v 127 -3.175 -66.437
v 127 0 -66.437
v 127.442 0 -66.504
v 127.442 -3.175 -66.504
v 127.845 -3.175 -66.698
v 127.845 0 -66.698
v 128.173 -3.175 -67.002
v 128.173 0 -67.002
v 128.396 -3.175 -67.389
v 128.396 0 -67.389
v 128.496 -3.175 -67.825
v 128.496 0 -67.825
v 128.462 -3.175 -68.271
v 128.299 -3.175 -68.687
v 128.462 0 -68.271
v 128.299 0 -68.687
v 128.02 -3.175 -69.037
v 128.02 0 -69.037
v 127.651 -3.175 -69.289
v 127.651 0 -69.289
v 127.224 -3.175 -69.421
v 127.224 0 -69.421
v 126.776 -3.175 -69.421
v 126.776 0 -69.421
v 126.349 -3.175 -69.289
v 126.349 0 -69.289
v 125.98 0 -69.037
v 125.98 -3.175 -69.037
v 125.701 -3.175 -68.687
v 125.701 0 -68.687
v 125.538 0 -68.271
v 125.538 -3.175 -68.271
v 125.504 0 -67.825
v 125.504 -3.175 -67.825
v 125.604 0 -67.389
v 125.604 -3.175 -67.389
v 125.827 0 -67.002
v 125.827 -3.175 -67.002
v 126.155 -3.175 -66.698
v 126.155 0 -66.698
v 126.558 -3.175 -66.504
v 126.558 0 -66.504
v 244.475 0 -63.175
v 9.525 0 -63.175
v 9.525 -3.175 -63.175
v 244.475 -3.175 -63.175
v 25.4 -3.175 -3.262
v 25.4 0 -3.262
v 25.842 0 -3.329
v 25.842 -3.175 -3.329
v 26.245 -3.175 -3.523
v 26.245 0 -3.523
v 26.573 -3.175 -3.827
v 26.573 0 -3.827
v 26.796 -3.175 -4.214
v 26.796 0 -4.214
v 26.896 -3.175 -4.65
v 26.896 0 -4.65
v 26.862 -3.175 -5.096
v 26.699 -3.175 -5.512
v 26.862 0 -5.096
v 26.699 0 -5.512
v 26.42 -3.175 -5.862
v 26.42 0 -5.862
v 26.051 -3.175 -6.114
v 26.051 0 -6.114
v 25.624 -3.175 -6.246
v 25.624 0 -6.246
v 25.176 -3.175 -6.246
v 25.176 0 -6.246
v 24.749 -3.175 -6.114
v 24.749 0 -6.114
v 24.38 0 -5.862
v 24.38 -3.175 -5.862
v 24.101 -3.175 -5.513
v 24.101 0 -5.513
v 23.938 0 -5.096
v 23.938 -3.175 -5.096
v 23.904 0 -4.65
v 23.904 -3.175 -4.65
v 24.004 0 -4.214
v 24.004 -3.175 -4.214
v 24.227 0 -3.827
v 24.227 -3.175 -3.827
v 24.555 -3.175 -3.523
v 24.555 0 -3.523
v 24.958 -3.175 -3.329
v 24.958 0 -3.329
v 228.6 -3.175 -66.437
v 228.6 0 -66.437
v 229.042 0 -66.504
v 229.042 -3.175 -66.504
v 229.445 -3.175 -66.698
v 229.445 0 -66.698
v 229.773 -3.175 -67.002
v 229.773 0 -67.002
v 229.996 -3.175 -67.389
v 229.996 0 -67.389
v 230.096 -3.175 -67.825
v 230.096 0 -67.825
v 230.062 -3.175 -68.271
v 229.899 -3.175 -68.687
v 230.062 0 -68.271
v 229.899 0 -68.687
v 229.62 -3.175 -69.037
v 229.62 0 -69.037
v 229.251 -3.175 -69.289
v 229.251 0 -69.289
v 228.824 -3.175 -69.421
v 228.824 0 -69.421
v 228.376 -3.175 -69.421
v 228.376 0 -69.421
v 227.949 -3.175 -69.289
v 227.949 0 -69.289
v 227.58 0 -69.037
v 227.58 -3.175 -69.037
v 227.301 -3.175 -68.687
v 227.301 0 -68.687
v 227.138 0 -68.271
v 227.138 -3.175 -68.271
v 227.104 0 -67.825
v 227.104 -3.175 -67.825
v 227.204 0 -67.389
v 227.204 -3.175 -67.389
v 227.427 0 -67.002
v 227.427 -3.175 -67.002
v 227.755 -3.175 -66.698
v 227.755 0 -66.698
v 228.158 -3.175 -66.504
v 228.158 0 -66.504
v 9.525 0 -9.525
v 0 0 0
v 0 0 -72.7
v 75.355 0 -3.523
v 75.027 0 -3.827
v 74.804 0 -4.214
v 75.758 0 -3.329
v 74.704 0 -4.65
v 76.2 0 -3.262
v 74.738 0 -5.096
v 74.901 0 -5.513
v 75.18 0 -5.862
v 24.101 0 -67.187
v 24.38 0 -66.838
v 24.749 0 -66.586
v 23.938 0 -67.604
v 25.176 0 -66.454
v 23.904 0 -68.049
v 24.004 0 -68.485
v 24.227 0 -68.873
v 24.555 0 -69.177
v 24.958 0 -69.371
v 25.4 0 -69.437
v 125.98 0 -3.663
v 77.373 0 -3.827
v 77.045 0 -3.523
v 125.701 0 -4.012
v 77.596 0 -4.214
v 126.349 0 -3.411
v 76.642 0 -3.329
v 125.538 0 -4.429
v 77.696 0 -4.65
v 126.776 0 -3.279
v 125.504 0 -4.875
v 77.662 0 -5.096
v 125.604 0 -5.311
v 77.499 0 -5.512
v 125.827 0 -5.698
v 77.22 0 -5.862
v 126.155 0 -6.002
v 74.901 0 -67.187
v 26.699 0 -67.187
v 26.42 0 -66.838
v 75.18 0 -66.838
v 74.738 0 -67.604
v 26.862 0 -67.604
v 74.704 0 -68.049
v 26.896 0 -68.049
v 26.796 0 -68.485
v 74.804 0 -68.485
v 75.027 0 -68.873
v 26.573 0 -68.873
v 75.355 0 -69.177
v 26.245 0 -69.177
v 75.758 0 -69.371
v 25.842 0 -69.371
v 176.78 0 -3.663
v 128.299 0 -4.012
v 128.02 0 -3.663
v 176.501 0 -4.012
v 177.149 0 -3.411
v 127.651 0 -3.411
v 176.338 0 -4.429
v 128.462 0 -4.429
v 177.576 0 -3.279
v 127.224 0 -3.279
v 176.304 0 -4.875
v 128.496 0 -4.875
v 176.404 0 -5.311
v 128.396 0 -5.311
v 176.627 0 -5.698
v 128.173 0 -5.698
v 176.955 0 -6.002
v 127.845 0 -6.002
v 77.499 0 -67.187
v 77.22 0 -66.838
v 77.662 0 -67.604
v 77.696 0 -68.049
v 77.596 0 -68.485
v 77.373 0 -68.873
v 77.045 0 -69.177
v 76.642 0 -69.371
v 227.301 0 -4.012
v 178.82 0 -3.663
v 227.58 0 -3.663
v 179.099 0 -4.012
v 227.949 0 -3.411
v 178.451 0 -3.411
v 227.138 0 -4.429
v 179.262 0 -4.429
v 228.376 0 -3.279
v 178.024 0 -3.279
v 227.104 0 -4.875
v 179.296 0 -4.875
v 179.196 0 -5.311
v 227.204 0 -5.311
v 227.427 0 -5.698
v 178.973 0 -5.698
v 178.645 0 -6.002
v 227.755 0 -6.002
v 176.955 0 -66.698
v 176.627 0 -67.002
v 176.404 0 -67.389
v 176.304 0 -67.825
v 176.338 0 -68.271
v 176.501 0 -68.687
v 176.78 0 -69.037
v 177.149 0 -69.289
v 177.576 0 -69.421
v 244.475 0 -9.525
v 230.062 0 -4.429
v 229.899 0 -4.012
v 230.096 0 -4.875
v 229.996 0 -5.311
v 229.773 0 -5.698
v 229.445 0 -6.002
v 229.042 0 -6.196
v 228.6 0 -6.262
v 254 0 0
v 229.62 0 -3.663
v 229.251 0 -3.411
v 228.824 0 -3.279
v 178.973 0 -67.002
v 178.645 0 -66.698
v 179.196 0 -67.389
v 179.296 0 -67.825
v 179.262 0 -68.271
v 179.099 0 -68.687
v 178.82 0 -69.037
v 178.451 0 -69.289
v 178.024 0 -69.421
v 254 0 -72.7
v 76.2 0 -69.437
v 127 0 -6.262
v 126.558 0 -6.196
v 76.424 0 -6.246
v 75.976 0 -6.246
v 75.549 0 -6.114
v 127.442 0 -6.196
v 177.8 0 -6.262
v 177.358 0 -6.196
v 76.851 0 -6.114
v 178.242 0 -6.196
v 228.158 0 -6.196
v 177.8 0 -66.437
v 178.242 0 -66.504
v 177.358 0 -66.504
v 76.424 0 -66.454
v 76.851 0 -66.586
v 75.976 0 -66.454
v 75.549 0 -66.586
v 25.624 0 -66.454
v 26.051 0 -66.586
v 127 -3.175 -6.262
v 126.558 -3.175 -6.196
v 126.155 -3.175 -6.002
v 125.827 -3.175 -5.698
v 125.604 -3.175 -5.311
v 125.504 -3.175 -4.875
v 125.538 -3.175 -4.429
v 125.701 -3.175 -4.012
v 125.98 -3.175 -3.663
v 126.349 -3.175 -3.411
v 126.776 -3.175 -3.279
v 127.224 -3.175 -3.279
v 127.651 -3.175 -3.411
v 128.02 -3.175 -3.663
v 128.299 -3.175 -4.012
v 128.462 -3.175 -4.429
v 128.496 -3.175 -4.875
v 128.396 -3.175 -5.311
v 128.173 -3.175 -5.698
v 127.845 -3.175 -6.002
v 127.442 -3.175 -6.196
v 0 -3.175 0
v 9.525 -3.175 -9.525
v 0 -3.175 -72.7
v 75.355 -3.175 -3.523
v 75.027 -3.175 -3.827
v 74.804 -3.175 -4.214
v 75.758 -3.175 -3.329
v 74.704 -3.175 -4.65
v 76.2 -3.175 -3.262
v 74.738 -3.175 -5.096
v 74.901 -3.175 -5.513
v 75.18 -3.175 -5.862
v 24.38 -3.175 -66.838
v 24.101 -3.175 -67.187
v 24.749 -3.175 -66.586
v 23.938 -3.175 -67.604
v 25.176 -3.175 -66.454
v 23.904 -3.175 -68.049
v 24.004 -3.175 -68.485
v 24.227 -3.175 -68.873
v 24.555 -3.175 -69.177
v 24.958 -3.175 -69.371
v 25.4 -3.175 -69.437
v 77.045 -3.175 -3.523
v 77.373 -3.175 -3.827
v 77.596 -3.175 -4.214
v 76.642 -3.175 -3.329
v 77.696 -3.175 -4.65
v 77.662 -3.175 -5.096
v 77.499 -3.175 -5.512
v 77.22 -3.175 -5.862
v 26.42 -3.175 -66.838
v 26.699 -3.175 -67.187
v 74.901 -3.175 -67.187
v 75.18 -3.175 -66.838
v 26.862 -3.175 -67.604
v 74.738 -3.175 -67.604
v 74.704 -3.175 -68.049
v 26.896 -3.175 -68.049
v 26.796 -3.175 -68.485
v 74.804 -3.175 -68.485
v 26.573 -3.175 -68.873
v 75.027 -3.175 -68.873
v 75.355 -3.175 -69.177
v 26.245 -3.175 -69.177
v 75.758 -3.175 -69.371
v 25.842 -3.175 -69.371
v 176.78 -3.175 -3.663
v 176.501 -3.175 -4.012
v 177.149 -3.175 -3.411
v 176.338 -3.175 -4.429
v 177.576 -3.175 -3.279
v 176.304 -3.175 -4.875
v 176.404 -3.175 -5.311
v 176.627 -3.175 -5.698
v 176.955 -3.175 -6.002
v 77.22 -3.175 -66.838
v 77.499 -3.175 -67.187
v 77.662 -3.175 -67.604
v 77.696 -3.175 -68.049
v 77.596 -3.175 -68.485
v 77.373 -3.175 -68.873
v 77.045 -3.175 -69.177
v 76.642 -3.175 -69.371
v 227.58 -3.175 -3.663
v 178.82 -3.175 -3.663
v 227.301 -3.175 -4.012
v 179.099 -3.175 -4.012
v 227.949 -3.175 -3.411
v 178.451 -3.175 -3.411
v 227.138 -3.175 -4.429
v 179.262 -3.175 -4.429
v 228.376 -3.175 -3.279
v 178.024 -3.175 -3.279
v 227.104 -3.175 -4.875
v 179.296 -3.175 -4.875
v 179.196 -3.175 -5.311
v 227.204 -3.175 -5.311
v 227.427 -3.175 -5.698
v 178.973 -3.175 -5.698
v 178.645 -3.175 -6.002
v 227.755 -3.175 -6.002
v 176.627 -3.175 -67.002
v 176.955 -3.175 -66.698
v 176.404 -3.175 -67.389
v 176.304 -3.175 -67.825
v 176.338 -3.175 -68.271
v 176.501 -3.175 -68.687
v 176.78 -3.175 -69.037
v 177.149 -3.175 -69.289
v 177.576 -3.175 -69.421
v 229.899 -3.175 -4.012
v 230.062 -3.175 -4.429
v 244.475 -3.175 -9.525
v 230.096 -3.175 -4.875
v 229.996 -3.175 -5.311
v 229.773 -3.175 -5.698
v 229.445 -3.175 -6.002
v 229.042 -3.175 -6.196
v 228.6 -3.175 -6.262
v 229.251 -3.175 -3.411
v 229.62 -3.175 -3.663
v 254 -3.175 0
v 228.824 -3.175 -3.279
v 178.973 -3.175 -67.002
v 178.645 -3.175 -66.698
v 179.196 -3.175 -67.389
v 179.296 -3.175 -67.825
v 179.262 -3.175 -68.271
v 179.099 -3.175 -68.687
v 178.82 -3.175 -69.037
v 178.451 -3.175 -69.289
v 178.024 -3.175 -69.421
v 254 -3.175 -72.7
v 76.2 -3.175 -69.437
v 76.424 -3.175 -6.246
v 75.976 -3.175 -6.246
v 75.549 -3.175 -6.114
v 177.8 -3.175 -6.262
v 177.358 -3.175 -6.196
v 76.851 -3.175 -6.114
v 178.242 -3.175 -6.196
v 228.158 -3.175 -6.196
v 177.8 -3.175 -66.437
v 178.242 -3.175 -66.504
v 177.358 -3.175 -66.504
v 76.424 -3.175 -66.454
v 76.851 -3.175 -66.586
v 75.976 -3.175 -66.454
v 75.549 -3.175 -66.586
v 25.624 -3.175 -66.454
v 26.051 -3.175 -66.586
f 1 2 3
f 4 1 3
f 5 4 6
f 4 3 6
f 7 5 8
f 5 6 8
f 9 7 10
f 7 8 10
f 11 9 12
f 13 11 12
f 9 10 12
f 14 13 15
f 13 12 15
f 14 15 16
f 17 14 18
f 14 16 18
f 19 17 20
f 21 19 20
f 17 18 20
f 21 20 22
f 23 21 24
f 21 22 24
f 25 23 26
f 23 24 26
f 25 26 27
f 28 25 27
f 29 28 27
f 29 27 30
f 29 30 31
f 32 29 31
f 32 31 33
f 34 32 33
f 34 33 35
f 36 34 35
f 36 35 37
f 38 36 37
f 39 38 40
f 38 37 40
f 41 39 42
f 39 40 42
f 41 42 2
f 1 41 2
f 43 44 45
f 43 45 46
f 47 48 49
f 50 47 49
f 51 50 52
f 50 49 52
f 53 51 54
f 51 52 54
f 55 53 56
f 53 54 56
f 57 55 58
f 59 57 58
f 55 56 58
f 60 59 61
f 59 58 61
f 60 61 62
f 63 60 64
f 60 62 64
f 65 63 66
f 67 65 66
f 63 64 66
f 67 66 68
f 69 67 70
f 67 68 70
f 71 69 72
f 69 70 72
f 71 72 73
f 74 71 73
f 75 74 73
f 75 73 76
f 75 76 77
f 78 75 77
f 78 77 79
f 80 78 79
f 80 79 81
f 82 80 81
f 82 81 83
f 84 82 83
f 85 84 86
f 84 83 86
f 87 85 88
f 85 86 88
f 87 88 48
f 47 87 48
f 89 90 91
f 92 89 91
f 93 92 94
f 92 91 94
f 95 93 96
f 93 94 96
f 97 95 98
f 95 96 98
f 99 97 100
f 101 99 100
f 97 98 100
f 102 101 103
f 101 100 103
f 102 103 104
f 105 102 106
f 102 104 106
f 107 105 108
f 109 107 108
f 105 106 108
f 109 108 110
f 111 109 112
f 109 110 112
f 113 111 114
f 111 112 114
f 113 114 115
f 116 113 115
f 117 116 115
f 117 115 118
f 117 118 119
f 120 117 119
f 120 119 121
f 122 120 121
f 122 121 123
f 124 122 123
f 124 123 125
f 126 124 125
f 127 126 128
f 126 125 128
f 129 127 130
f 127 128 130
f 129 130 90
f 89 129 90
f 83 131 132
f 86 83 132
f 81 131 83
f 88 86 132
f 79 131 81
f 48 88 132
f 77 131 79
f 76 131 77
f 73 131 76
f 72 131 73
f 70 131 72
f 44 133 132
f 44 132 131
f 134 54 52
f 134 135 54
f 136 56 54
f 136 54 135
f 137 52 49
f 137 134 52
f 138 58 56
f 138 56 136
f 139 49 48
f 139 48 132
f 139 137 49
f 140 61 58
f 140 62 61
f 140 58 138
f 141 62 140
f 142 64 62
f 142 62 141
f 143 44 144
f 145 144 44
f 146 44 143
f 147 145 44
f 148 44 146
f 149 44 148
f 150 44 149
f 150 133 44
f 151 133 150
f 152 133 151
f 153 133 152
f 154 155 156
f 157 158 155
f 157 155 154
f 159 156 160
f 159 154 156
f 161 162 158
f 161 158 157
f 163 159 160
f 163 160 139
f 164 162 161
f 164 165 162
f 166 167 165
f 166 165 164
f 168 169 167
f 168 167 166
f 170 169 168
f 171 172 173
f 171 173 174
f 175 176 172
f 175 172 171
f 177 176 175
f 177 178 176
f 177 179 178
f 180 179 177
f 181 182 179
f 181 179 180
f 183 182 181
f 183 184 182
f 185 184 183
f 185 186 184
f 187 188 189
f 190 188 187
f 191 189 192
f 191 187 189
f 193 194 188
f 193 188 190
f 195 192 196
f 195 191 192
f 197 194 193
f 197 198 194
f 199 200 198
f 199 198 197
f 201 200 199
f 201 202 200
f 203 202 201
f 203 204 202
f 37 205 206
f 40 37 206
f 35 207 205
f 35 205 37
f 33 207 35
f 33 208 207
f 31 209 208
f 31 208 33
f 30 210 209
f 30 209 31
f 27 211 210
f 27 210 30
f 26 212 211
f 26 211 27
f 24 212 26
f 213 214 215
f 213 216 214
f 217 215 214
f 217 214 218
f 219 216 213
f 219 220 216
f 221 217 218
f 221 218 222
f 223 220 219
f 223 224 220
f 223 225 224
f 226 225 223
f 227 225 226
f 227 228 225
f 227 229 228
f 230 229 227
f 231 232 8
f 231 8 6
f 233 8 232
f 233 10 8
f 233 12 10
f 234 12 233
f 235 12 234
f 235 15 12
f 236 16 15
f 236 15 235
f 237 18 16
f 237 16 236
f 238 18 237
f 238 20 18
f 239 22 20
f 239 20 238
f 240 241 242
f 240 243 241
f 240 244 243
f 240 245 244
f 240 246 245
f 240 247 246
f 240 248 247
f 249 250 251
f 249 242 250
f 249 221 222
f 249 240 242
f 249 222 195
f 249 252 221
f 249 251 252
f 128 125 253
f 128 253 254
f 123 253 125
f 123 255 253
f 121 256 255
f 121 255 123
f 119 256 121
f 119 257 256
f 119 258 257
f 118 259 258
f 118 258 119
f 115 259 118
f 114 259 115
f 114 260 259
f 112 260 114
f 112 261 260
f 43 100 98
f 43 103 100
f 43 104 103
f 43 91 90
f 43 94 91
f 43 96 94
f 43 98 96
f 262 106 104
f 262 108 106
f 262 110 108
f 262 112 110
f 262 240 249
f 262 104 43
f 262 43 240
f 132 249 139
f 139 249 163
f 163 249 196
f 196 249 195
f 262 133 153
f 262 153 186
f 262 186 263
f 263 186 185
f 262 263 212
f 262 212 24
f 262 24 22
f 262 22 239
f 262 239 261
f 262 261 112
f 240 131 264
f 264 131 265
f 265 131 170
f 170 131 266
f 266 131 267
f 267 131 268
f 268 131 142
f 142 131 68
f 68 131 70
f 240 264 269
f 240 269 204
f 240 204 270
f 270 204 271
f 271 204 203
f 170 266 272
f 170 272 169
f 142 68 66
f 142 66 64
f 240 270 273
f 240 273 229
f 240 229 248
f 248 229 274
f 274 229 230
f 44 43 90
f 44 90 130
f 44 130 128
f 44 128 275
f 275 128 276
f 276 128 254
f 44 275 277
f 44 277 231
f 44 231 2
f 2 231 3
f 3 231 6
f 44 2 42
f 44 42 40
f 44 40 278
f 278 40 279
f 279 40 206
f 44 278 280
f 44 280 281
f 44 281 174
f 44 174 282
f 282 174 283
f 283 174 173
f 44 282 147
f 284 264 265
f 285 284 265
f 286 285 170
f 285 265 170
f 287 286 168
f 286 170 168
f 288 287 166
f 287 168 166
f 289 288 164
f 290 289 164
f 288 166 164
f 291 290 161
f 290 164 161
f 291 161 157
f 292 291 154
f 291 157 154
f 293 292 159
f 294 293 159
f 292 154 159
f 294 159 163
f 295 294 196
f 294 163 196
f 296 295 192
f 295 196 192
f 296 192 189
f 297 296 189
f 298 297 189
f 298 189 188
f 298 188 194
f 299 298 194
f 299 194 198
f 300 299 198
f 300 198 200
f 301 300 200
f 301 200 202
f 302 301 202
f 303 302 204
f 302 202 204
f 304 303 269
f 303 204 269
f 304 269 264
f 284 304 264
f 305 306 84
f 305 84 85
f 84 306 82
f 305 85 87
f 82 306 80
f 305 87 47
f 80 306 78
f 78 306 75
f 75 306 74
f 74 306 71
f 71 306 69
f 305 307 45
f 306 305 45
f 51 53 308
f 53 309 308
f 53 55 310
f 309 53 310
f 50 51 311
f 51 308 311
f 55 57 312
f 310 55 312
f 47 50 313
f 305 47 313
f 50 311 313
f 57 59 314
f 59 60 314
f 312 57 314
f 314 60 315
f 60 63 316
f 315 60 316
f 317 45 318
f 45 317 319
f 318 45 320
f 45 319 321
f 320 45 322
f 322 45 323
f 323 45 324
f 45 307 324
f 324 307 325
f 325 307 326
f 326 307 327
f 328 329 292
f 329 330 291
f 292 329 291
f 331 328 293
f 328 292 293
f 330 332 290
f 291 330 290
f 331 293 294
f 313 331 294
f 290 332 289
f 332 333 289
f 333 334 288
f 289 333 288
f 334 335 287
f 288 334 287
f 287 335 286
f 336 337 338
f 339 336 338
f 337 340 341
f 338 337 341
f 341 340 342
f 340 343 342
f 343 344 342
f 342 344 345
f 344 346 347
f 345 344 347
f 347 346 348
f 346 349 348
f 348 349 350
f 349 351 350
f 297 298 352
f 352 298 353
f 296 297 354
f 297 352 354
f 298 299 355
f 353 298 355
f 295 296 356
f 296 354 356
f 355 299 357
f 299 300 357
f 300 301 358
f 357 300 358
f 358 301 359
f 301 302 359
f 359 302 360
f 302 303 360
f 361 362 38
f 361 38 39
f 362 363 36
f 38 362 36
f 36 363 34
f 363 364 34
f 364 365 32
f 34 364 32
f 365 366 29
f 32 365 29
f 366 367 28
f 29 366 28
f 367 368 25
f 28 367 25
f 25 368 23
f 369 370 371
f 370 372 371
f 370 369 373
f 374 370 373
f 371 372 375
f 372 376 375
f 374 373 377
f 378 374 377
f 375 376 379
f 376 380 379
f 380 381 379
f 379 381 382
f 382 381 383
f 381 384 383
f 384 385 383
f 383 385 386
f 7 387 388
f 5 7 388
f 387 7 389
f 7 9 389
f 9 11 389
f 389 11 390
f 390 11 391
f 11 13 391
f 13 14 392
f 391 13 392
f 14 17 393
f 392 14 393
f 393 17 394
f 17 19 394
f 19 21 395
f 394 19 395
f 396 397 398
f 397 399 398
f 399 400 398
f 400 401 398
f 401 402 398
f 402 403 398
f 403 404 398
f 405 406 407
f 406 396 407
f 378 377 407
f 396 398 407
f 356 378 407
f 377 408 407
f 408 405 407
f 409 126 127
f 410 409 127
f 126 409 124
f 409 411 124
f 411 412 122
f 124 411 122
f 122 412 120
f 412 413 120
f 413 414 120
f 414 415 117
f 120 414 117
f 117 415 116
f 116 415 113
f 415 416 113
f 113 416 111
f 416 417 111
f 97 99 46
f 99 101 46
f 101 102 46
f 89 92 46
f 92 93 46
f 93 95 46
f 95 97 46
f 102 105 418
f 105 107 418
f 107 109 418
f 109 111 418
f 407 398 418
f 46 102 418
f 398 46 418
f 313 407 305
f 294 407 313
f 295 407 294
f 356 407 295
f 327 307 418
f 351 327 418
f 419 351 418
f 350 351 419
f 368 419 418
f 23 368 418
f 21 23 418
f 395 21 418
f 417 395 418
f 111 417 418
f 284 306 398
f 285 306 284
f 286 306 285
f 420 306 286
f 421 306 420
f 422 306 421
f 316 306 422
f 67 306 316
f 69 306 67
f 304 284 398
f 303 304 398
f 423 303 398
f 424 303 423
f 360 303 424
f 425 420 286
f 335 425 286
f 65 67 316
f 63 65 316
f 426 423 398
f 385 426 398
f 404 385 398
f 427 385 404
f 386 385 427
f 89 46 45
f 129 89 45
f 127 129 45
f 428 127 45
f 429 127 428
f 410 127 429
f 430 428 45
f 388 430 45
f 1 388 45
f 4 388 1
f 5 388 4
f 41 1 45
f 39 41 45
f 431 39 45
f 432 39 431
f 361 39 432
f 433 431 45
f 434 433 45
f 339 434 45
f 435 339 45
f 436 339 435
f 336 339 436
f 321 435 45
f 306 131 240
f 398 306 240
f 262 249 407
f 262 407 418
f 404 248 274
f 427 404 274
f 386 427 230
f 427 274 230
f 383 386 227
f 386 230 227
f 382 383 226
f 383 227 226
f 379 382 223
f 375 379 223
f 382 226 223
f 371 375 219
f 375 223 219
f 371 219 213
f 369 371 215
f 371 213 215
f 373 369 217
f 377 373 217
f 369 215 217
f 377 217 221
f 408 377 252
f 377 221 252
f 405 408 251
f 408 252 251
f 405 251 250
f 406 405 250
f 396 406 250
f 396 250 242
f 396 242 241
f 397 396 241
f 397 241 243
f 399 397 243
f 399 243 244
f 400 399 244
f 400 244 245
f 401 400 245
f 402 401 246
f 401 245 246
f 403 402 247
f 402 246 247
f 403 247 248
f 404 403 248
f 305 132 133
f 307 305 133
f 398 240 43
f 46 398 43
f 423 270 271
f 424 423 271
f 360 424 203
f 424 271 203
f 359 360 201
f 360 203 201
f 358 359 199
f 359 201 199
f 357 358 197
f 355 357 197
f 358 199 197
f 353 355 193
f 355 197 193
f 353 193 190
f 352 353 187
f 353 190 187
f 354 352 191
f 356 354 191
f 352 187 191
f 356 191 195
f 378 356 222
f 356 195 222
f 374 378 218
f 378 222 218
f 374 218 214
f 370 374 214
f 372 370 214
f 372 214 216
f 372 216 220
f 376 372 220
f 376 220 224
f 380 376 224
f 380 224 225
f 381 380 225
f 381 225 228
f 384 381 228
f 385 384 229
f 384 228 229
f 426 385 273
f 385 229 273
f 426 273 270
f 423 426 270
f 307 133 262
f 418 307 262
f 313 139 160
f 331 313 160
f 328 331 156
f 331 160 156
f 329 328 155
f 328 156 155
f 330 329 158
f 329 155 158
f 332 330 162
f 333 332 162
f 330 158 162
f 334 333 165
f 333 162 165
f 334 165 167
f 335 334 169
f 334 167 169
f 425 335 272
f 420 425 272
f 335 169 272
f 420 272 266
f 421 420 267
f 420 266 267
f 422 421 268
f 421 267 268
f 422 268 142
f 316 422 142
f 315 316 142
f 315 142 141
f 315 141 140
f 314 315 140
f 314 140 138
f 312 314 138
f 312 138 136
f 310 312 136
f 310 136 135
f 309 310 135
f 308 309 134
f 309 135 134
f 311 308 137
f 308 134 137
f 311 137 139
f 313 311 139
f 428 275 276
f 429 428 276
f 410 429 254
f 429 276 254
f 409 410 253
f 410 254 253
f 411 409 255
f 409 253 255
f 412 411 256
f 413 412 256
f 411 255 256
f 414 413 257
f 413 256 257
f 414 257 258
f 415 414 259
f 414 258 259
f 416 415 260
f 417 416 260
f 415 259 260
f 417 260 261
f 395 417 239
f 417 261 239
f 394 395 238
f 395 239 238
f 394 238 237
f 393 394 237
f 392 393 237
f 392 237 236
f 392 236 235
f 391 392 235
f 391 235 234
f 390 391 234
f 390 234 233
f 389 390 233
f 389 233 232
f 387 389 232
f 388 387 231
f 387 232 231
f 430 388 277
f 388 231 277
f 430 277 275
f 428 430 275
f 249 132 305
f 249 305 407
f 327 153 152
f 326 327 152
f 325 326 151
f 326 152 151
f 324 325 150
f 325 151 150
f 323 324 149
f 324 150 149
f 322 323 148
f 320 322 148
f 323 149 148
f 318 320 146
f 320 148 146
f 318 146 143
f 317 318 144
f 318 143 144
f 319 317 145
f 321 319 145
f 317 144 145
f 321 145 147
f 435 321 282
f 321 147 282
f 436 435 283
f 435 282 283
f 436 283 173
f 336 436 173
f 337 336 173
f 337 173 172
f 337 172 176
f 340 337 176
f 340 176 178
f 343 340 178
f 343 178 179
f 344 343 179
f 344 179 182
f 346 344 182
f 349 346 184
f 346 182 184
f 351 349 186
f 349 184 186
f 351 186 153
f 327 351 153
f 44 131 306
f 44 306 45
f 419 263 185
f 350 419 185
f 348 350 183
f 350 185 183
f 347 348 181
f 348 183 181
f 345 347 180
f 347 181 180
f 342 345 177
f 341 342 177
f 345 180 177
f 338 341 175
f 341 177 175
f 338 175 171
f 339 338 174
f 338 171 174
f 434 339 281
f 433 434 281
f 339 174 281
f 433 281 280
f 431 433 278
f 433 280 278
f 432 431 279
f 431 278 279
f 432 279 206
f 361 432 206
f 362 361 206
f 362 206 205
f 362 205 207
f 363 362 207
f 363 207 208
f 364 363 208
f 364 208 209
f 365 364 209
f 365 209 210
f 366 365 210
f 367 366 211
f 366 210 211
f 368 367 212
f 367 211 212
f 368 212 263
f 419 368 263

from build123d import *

# Parameters (mm, degrees)
SKETCH1_W           = 254
SKETCH1_H           = 72.69988
SKETCH1_R           = 1.5
SKETCH1_W_2         = 234.95
SKETCH1_H_2         = 53.64988
BOSS_EXTRUDE1_DEPTH = 3.175


with BuildPart() as part:
    # Sketch1 → Boss-Extrude1 (new body)
    with BuildSketch(Plane(origin=(0, 0, 0), x_dir=(1, 0, 0), z_dir=(0, 1, 0))):
        with Locations((127, 36.34994)):
            Rectangle(SKETCH1_W, SKETCH1_H)
        with Locations(Location((177.8, 67.93738, 0), (0, 0, 270))):
            Circle(SKETCH1_R, mode=Mode.SUBTRACT)
        with Locations(Location((177.8, 4.7625, 0), (0, 0, 90))):
            Circle(SKETCH1_R, mode=Mode.SUBTRACT)
        with Locations(Location((228.6, 67.93738, 0), (0, 0, 270))):
            Circle(SKETCH1_R, mode=Mode.SUBTRACT)
        with Locations(Location((228.6, 4.7625, 0), (0, 0, 90))):
            Circle(SKETCH1_R, mode=Mode.SUBTRACT)
        with Locations(Location((127, 67.93738, 0), (0, 0, 270))):
            Circle(SKETCH1_R, mode=Mode.SUBTRACT)
        with Locations(Location((127, 4.7625, 0), (0, 0, 90))):
            Circle(SKETCH1_R, mode=Mode.SUBTRACT)
        with Locations(Location((25.4, 4.7625, 0), (0, 0, 270))):
            Circle(SKETCH1_R, mode=Mode.SUBTRACT)
        with Locations(Location((76.2, 4.7625, 0), (0, 0, 270))):
            Circle(SKETCH1_R, mode=Mode.SUBTRACT)
        with Locations(Location((25.4, 67.93738, 0), (0, 0, 90))):
            Circle(SKETCH1_R, mode=Mode.SUBTRACT)
        with Locations(Location((76.2, 67.93738, 0), (0, 0, 90))):
            Circle(SKETCH1_R, mode=Mode.SUBTRACT)
        with Locations((127, 36.34994)):
            Rectangle(SKETCH1_W_2, SKETCH1_H_2, mode=Mode.SUBTRACT)
    extrude(amount=-BOSS_EXTRUDE1_DEPTH)


solid = part.part
